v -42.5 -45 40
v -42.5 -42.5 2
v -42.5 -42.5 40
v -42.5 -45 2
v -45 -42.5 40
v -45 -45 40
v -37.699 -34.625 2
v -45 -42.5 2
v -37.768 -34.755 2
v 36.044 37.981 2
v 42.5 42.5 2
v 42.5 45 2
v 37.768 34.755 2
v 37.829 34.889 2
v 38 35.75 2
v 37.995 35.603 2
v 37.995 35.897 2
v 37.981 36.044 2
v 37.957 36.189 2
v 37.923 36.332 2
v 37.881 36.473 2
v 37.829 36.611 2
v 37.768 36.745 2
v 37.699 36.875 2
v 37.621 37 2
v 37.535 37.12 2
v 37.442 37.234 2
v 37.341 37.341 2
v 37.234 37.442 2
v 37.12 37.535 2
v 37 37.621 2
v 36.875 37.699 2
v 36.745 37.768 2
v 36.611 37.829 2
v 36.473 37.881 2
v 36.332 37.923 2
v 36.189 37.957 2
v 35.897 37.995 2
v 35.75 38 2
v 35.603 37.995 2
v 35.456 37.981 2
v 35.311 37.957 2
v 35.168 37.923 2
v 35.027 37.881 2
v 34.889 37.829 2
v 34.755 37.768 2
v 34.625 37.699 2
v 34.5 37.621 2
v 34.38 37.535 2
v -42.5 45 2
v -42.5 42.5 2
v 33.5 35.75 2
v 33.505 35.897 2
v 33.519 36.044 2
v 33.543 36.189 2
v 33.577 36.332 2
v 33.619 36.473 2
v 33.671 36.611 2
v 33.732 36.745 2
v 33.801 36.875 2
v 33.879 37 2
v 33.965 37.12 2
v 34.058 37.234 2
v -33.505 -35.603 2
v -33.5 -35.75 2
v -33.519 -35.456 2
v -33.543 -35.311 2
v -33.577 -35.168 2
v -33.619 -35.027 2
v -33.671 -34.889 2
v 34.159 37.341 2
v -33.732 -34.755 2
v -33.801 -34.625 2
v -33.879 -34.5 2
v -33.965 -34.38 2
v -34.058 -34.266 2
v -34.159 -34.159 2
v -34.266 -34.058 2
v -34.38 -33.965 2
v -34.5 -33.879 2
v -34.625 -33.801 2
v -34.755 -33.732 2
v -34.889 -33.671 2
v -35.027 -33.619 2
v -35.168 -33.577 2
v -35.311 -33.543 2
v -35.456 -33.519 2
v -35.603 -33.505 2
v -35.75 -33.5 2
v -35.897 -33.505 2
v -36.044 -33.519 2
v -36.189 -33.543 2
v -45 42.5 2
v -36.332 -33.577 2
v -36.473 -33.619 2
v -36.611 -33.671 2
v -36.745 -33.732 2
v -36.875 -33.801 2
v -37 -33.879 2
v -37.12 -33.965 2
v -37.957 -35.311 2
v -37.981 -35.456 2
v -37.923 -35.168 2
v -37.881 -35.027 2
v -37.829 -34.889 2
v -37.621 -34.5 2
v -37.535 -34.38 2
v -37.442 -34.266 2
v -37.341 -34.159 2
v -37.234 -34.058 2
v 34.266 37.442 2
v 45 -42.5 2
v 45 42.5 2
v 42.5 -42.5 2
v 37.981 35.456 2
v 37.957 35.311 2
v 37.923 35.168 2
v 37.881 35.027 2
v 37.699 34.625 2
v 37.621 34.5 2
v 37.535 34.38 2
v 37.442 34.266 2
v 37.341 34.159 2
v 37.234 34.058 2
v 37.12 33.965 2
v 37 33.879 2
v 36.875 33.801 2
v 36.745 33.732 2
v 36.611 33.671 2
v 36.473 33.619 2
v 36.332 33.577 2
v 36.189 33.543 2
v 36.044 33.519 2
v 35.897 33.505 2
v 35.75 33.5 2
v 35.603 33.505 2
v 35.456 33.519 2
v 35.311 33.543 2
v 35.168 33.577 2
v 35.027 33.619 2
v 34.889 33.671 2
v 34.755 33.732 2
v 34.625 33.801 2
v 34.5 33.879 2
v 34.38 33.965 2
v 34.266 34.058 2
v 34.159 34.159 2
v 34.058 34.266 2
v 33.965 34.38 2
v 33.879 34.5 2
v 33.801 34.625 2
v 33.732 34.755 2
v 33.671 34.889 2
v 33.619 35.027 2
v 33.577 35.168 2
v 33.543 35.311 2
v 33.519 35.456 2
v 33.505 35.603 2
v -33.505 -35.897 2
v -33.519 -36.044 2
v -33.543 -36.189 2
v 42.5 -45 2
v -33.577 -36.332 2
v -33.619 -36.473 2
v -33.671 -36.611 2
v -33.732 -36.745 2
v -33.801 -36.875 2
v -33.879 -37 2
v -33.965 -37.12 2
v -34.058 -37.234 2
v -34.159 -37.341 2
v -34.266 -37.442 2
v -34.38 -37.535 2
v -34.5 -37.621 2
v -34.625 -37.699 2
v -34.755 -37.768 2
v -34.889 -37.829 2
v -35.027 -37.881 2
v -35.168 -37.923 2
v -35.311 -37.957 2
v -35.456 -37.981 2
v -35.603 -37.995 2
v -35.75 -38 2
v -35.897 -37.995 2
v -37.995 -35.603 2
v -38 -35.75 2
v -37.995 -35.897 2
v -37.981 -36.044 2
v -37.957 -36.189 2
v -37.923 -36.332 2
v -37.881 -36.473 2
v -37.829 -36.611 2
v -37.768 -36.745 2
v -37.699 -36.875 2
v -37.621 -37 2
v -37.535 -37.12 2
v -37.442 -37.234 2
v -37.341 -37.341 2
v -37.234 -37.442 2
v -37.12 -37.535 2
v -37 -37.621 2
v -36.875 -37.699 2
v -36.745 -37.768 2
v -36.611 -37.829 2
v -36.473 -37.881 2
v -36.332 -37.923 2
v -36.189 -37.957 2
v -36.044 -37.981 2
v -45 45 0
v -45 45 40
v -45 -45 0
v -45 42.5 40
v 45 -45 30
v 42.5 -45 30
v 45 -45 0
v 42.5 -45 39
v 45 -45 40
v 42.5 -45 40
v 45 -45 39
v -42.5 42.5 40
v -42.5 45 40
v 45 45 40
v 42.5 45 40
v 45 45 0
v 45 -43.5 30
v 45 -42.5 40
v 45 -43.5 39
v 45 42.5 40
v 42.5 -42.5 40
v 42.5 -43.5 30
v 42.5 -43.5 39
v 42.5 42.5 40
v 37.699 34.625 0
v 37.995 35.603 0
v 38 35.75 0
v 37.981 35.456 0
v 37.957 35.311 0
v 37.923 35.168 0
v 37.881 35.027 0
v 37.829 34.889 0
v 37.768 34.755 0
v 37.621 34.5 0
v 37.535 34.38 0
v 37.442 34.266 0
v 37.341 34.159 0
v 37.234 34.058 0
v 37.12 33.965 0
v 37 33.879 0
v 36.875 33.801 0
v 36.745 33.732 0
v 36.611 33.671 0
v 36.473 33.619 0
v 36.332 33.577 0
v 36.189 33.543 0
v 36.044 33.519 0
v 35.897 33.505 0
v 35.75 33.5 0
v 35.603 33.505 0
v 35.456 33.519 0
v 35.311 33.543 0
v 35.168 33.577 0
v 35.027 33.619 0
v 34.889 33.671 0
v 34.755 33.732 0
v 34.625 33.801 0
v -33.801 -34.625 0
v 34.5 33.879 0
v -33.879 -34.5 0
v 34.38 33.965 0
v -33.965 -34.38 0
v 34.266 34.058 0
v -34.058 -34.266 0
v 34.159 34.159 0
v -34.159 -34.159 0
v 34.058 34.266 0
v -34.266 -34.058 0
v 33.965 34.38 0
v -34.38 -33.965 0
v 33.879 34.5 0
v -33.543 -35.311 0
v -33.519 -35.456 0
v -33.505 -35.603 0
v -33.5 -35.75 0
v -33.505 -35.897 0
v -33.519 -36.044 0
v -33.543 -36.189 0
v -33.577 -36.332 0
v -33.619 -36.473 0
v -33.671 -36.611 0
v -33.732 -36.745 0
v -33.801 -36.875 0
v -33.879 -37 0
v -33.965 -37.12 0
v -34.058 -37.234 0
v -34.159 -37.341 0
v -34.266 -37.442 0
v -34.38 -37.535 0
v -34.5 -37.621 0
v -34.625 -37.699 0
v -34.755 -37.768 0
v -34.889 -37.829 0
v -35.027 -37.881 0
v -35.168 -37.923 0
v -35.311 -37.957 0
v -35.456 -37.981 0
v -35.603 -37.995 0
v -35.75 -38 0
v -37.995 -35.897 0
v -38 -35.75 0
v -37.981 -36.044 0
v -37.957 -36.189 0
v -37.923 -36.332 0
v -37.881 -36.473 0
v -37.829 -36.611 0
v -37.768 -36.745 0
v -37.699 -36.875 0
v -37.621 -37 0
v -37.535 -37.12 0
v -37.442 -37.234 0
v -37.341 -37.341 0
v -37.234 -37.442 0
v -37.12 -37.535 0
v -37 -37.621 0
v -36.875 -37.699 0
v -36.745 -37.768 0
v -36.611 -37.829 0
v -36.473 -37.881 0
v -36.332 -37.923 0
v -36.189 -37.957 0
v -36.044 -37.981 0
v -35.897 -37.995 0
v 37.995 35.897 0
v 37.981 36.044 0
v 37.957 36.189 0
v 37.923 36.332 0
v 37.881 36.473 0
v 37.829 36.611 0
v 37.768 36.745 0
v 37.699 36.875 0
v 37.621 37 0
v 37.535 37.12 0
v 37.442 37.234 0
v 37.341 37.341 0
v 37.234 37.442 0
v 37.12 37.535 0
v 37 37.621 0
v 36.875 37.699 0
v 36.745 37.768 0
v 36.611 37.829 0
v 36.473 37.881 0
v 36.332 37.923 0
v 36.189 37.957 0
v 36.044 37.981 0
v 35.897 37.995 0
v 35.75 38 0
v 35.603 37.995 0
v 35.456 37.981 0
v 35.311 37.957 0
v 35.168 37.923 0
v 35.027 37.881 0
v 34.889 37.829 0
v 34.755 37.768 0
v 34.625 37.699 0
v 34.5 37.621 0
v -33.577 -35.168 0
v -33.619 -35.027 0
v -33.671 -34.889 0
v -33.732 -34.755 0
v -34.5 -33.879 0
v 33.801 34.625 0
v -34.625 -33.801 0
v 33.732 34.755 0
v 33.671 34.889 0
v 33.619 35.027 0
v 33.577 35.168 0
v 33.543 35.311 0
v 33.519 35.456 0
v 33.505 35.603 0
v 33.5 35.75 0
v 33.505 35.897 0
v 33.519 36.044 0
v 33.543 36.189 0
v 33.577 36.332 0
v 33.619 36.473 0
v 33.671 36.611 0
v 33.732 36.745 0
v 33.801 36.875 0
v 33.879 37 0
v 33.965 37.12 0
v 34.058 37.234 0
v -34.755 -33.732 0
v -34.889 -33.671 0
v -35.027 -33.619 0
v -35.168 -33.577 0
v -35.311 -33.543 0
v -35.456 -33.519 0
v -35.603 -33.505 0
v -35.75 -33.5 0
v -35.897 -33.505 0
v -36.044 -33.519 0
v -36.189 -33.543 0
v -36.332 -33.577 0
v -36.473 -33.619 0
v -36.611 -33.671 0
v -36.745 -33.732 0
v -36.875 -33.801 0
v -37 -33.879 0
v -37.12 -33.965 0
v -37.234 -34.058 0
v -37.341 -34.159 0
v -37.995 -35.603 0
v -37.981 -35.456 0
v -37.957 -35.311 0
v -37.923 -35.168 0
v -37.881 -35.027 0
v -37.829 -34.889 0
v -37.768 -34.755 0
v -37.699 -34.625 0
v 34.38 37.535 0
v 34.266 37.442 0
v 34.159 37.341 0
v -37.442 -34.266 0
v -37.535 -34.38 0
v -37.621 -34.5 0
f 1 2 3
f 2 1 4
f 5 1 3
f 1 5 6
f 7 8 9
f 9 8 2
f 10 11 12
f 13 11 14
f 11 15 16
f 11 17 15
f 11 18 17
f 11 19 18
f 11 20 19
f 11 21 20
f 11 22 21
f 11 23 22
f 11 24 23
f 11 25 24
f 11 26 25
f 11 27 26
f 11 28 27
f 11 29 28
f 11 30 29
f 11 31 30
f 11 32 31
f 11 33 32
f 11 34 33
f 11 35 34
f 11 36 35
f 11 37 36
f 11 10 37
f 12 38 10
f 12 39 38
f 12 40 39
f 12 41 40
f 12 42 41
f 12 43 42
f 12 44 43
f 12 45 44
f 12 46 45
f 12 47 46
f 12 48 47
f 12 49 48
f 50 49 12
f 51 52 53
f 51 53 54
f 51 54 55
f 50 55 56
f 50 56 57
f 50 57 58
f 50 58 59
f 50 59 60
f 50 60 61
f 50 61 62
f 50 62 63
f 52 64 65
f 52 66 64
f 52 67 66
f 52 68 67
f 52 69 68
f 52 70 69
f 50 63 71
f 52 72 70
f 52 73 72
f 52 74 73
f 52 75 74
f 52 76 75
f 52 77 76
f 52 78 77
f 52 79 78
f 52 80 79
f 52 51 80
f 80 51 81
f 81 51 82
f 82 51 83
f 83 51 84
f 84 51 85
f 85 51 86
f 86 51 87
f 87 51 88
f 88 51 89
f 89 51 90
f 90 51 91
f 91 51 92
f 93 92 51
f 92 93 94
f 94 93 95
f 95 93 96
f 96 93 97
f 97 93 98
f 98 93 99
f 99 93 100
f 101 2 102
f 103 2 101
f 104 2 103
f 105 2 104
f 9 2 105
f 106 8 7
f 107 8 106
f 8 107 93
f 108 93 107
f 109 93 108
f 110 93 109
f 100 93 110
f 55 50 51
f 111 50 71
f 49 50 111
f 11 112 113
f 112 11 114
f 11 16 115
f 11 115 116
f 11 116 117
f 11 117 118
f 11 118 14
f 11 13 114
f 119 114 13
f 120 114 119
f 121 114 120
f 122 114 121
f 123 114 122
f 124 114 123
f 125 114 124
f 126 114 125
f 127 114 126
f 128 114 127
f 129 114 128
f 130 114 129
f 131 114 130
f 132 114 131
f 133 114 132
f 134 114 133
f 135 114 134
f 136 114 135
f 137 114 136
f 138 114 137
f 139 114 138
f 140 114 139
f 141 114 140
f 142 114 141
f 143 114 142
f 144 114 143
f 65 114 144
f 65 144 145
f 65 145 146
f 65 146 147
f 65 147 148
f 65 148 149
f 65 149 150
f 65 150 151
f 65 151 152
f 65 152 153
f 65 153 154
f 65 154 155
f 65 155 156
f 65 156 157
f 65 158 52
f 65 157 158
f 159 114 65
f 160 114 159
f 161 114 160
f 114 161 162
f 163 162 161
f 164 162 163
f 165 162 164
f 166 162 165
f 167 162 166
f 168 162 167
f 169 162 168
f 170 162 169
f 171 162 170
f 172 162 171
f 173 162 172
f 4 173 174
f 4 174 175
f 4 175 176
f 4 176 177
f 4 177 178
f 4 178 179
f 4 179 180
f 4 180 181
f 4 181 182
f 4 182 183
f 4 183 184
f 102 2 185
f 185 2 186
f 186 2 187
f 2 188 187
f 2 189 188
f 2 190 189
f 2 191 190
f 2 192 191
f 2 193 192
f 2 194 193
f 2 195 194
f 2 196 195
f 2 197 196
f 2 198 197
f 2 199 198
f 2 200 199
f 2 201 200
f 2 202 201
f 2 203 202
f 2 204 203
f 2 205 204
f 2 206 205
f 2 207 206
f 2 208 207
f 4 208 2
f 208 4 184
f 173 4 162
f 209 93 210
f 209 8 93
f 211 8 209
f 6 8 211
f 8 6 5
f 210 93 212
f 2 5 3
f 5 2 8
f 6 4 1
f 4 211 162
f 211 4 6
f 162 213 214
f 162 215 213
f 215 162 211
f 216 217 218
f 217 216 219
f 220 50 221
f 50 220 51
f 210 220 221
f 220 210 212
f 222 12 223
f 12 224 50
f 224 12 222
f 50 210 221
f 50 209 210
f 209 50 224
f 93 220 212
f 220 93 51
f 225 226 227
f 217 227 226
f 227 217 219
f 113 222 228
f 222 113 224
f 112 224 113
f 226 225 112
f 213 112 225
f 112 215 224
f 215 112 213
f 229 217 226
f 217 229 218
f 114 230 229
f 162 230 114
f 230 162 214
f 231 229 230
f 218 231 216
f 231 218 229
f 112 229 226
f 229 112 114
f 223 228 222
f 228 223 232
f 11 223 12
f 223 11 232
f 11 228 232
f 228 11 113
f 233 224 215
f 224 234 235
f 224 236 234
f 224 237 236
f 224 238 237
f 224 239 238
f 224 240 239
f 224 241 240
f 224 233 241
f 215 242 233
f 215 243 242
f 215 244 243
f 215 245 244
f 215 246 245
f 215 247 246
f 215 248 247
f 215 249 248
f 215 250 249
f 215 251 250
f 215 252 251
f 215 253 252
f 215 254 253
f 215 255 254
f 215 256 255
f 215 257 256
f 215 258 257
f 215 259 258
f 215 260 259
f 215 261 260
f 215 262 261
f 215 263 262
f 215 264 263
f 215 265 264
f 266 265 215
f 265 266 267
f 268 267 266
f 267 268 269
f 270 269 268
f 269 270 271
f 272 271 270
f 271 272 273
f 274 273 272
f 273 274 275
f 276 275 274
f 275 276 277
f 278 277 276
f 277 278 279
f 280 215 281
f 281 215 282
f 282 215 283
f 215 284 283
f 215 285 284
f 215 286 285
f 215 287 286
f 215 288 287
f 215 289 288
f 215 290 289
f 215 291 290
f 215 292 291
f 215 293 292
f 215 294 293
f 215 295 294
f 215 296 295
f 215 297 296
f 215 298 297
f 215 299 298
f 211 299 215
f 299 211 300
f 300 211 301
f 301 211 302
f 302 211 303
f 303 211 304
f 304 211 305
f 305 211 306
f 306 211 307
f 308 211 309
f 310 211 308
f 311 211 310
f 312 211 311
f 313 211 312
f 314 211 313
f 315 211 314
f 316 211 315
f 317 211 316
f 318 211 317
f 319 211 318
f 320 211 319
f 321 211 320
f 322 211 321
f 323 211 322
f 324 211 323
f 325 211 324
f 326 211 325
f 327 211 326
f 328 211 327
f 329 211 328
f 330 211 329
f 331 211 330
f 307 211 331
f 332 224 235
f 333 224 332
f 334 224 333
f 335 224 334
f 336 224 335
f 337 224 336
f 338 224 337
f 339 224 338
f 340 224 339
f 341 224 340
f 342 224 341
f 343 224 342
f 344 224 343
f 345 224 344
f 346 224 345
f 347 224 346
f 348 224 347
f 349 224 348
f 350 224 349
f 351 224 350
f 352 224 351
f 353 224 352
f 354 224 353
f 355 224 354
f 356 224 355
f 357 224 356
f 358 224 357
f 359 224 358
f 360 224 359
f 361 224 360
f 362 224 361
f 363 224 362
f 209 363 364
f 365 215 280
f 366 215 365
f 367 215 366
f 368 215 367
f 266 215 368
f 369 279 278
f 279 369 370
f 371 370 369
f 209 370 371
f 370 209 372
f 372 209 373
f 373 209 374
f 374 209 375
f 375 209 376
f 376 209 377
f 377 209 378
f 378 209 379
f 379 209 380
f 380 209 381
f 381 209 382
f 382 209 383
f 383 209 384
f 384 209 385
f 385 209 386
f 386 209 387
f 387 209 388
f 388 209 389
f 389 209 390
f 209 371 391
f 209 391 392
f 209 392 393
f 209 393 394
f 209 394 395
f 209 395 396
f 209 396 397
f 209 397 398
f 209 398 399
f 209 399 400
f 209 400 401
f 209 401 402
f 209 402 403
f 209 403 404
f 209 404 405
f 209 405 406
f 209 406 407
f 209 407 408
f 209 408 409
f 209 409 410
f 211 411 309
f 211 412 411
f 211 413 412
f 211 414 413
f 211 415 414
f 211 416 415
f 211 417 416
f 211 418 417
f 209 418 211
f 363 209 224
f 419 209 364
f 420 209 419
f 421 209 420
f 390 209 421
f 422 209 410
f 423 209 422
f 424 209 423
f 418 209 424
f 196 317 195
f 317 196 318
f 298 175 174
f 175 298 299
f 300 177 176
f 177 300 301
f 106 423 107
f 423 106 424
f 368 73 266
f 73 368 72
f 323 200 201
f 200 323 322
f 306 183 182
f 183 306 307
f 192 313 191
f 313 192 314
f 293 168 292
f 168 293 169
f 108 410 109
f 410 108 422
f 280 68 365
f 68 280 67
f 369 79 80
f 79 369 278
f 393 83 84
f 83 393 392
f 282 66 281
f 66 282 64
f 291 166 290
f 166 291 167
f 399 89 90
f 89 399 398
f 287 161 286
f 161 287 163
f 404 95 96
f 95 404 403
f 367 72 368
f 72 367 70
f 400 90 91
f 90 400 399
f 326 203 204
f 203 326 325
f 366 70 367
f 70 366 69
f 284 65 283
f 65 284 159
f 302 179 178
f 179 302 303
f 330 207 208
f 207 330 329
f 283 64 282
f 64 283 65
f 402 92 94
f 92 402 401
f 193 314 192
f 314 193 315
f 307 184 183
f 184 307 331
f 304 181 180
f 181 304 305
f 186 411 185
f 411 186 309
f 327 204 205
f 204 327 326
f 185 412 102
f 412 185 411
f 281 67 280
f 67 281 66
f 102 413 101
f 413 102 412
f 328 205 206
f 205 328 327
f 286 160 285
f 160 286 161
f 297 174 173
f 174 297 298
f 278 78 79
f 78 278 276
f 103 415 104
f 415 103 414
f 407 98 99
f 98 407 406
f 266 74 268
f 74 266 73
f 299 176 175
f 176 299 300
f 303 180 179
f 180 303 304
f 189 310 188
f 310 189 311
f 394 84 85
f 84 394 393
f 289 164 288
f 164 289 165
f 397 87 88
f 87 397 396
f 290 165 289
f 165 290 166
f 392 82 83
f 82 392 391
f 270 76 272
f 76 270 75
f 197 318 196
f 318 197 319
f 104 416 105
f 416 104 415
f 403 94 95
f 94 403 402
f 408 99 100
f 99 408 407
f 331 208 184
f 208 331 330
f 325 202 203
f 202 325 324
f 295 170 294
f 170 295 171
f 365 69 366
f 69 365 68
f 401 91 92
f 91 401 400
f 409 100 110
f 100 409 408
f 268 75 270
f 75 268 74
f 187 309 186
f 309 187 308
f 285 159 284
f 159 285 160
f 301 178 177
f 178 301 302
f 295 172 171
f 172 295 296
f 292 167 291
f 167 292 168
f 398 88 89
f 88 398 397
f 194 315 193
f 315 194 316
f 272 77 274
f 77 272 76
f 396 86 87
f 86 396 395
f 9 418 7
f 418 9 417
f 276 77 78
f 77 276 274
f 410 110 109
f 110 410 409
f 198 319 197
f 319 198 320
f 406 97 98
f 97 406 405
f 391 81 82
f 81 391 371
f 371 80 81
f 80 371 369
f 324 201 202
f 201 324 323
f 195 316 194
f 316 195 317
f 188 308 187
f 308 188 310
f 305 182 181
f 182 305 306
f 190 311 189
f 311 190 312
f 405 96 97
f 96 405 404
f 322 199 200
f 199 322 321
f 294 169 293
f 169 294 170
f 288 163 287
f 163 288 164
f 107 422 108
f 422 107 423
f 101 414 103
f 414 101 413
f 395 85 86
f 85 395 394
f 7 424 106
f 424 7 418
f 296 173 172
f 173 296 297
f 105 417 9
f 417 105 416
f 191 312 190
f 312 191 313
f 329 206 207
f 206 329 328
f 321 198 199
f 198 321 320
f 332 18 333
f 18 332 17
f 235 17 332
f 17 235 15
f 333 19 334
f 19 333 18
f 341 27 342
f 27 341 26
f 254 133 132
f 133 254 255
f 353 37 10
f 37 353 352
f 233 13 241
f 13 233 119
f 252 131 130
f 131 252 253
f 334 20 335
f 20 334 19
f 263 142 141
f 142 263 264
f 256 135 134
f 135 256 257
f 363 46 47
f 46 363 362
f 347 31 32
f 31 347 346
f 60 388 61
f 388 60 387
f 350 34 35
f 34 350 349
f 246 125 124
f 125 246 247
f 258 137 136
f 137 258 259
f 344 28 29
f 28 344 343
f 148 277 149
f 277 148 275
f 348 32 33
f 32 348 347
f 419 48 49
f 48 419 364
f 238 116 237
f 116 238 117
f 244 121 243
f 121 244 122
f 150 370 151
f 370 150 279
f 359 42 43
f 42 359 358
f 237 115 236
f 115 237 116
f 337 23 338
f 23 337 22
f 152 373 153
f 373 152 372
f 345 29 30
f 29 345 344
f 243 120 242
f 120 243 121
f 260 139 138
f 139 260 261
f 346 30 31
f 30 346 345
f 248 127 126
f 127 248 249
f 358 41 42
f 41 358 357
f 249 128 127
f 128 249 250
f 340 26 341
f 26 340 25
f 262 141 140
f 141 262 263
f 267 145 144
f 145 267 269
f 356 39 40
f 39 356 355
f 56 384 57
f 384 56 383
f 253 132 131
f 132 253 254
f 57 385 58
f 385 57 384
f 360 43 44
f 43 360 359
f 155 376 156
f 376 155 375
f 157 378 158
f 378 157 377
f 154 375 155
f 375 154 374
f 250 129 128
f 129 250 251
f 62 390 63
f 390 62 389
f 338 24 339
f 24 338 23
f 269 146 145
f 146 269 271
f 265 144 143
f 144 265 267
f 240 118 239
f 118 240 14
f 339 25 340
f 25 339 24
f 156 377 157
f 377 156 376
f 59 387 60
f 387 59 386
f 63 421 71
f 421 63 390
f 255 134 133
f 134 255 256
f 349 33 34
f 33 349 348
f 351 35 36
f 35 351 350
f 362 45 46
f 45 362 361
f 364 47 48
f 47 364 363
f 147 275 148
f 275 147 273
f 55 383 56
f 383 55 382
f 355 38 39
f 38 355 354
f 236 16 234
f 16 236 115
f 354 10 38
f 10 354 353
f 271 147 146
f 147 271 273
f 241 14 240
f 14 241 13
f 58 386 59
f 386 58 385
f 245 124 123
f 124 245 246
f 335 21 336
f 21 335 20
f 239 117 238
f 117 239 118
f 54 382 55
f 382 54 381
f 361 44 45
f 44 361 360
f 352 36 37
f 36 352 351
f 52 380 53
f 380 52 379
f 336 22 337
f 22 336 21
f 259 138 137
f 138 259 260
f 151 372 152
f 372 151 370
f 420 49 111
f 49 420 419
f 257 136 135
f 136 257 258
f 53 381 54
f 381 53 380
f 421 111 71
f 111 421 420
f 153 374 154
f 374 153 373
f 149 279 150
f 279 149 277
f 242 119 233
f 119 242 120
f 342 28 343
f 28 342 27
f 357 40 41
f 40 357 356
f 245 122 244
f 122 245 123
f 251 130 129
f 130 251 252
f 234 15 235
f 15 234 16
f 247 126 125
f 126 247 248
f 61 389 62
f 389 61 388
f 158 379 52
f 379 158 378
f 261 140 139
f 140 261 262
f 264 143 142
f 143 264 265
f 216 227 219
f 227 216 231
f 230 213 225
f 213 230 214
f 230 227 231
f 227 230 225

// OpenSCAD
// DIY magnetic stirrer housing for 80 mm PC case fan
// Print orientation: upside-down open box, top plate on bed (z = 0 to 2)

// ---------- Parameters ----------
top_thickness      = 2;     // top plate thickness
wall_thickness     = 2.5;   // wall thickness
box_height         = 40;    // total height of walls (z = 0 to 40)
outer_size         = 90;    // outer X and Y size of box
screw_hole_count   = 4;     // number of M4 screw holes
screw_hole_d       = 4.5;   // screw hole diameter
screw_hole_pitch   = 71.5;  // square pitch between hole centres
cable_notch_w      = 12;    // cable notch width
cable_notch_depth  = 8;     // notch depth from open edge (z = 32 to 40)
eps                = 0.5;   // overcut for clean differences
$fn                = 96;    // curve resolution

// ---------- Model ----------
difference() {
    union() {
        // Top plate
        translate([-outer_size/2, -outer_size/2, 0])
            cube([outer_size, outer_size, top_thickness]);

        // Walls, open top
        for (sx = [-1, 1], sy = [-1, 1])
            translate([sx > 0 ? outer_size/2 - wall_thickness : -outer_size/2,
                       sy > 0 ? outer_size/2 - wall_thickness : -outer_size/2,
                       top_thickness])
                cube([wall_thickness, wall_thickness, box_height - top_thickness]);
    }

    // Screw holes through top plate
    for (i = [0 : screw_hole_count - 1]) {
        a = (i - (screw_hole_count - 1)/2) * screw_hole_pitch;
        translate([a, a, -eps])
            cylinder(d = screw_hole_d, h = top_thickness + 2*eps);
    }

    // Cable notch in one wall (z = 32 to 40)
    translate([outer_size/2 - wall_thickness - cable_notch_w/2,
               -outer_size/2 - eps,
               box_height - top_thickness - cable_notch_depth])
        cube([cable_notch_w, 2*eps + 1, cable_notch_depth + 1]);
}
